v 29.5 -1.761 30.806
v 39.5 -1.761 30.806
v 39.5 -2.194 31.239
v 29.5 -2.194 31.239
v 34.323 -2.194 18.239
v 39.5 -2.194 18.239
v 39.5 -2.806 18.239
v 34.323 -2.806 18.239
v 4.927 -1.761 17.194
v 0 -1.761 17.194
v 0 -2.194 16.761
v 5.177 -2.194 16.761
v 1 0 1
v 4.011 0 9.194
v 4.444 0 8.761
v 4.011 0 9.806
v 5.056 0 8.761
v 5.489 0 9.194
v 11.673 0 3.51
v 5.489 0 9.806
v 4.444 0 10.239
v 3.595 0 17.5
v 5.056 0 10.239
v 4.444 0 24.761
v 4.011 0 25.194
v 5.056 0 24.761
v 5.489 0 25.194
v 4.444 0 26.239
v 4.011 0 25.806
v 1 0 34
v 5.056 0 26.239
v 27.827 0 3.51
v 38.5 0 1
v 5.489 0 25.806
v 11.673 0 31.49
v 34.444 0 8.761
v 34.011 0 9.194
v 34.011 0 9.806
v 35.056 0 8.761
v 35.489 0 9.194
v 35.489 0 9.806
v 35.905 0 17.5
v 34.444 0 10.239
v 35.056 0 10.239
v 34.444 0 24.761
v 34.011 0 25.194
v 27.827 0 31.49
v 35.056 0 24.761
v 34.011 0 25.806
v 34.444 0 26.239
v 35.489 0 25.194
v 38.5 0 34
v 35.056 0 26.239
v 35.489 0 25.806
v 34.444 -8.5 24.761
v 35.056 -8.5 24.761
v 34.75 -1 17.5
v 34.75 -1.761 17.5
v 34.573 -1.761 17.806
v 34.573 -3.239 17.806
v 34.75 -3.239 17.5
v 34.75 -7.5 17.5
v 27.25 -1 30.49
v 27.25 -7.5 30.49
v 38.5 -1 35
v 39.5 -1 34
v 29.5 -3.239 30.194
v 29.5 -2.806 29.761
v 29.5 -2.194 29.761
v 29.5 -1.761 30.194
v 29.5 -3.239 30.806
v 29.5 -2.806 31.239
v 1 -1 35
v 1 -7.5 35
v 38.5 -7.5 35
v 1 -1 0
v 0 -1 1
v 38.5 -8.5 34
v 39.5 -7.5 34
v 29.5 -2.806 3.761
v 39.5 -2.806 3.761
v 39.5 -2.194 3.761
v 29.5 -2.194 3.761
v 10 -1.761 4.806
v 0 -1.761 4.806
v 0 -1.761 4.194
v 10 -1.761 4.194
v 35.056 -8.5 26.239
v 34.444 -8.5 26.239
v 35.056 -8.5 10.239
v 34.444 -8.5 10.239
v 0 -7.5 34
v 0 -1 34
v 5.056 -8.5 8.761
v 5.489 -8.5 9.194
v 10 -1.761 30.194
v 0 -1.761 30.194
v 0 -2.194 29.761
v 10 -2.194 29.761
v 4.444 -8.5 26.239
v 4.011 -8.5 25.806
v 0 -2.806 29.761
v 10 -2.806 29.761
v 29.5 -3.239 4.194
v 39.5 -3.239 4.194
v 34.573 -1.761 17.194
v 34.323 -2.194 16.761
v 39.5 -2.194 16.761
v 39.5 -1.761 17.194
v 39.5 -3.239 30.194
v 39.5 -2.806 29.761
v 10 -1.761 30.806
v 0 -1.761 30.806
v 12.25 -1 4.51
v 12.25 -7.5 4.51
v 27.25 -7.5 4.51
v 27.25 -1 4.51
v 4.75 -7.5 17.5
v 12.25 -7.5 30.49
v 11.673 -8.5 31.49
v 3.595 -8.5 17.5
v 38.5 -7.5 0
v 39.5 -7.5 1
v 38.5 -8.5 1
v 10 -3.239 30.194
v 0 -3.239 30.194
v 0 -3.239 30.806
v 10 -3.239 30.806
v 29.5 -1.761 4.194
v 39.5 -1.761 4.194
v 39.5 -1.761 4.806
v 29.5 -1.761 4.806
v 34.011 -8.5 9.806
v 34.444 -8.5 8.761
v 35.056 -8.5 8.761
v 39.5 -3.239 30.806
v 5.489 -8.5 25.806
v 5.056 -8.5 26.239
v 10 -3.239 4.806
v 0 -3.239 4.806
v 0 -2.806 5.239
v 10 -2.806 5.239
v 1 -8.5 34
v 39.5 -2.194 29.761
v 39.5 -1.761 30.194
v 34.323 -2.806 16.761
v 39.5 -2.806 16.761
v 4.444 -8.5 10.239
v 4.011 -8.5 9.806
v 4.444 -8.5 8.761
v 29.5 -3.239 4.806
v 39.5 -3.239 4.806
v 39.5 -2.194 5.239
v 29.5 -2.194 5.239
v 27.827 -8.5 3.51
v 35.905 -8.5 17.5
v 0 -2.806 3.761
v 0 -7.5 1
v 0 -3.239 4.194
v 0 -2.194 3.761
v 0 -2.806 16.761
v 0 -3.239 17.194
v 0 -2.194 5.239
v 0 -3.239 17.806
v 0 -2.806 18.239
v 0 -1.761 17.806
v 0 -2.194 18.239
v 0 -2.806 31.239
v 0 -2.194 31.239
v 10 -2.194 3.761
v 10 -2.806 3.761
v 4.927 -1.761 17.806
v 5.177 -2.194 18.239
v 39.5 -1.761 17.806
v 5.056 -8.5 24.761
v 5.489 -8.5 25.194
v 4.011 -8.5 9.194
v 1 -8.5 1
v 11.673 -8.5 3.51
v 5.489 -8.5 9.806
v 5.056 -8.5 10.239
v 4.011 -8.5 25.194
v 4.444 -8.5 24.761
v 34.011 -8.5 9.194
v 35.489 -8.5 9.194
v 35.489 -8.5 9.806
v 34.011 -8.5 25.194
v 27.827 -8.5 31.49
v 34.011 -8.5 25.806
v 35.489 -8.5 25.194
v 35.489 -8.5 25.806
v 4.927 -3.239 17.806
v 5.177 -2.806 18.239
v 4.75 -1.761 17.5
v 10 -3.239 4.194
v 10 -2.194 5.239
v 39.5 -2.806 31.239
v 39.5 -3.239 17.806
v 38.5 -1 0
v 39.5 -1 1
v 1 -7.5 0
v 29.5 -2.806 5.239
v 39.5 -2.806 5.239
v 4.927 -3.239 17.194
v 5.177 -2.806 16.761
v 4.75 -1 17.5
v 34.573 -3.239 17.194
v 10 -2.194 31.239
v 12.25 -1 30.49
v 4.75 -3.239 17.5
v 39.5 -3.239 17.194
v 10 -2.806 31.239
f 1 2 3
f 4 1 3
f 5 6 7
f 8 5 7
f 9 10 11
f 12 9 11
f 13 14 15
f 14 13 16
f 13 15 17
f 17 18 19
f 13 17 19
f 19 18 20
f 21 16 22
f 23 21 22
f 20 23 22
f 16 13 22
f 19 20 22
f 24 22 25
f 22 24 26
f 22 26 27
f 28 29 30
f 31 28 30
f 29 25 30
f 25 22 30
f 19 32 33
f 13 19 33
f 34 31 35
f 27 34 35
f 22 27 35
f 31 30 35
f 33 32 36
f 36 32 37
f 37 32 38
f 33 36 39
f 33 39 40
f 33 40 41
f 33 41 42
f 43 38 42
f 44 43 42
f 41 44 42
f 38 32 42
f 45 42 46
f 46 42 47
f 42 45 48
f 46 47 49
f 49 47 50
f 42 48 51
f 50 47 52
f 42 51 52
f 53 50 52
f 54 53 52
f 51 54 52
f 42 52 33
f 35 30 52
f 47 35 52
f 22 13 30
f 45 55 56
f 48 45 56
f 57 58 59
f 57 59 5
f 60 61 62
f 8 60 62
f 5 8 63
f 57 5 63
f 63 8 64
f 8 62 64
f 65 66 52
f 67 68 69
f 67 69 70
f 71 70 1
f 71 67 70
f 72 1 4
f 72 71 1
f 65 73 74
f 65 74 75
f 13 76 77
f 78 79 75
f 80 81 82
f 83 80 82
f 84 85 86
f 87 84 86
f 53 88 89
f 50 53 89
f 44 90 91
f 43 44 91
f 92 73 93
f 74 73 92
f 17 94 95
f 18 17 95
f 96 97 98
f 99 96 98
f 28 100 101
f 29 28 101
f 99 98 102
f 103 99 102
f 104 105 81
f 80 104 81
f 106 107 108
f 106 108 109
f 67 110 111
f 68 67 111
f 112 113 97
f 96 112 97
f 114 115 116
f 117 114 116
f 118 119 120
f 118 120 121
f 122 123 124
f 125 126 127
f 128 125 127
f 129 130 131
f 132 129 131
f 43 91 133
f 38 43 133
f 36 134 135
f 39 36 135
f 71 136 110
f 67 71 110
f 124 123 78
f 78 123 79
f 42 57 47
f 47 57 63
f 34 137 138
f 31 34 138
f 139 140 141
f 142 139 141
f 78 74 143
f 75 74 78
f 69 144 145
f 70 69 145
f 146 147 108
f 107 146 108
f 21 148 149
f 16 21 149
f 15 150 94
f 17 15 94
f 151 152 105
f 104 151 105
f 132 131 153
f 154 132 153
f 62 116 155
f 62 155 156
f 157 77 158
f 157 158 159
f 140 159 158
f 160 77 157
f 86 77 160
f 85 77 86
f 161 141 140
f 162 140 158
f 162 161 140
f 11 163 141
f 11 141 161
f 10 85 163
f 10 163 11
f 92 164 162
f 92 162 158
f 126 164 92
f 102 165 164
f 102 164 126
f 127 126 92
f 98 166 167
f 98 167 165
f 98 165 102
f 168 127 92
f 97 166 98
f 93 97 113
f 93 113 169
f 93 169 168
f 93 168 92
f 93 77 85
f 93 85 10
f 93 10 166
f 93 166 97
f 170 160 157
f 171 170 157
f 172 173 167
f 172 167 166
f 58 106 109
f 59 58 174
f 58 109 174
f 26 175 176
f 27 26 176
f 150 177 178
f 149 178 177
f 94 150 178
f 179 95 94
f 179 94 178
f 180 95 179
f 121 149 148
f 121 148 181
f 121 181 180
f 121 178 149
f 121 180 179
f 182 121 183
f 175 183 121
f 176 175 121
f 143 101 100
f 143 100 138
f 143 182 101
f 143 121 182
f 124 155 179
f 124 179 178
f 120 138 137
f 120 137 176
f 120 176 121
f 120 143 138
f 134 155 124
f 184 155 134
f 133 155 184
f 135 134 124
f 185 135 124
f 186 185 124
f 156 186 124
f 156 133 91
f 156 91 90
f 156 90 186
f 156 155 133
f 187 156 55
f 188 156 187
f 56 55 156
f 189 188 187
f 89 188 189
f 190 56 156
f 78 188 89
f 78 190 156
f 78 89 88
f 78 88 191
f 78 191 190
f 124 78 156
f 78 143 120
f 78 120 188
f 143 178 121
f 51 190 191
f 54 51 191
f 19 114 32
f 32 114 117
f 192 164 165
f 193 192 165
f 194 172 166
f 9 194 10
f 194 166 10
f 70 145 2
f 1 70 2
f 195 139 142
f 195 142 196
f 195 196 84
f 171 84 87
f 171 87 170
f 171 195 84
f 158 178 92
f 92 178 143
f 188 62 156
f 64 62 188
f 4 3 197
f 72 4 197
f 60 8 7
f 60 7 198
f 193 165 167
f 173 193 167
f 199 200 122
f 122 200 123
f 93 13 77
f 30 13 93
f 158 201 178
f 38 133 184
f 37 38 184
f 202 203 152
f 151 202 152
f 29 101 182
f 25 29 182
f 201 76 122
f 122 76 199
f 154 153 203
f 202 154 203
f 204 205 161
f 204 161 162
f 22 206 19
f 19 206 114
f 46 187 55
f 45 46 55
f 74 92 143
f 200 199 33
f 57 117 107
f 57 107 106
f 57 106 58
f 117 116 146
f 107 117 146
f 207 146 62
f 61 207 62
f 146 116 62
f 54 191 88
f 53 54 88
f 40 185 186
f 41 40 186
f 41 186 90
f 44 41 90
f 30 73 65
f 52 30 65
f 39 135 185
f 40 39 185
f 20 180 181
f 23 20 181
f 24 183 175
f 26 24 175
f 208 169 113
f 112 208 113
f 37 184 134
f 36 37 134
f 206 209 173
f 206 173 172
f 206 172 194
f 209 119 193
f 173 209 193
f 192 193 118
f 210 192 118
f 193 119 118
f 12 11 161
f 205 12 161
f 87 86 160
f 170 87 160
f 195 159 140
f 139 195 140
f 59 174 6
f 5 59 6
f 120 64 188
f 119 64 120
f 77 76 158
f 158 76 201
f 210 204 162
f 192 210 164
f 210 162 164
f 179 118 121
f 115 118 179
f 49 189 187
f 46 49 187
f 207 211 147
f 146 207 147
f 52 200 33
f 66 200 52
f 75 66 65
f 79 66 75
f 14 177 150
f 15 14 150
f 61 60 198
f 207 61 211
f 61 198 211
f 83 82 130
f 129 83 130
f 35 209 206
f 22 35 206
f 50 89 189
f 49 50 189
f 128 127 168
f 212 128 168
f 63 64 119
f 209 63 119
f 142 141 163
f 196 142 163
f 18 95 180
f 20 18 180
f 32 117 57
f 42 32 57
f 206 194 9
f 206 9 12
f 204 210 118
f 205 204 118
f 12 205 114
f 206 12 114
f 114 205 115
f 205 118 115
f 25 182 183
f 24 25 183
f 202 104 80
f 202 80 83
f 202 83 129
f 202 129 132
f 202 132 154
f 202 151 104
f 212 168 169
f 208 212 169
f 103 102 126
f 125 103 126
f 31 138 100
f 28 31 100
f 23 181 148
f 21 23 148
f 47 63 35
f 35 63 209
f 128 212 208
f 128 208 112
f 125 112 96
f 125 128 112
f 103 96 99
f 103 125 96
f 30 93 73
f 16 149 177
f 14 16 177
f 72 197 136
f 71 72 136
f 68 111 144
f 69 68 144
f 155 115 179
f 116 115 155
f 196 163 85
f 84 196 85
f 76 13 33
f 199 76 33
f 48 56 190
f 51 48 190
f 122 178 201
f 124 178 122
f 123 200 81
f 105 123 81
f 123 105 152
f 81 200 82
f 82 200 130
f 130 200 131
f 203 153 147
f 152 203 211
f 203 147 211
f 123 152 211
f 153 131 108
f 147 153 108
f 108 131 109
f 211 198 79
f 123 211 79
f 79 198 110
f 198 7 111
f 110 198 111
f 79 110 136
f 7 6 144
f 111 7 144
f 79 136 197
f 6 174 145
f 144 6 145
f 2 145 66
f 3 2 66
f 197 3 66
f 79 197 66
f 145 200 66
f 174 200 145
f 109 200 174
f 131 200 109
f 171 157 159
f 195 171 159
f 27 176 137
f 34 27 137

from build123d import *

# Parameters (mm, degrees)
SKETCH_W        = 39.5
SKETCH_H        = 35
PAD_DEPTH       = 8.5
POCKET_DEPTH    = 10
POCKET001_DEPTH = 10
POCKET002_DEPTH = 8.501
CHAMFER_SIZE    = 1
CHAMFER001_SIZE = 1


with BuildPart() as part:
    # Sketch → Pad (new body)
    with BuildSketch(Plane.XZ):
        with Locations((19.75, 17.5)):
            Rectangle(SKETCH_W, SKETCH_H)
    extrude(amount=PAD_DEPTH)

    # Sketch001 (on Face2 of Pad) → Pocket (cut)
    with BuildSketch(Plane(origin=(39.5, 0, 0), x_dir=(0, 0, 1), z_dir=(1, 0, 0))):
        Polygon((4.193853, 3.239104), (3.760896, 2.806147), (3.760896, 2.193853), (4.193853, 1.760896), (4.806147, 1.760896), (5.239104, 2.193853), (5.239104, 2.806147), (4.806147, 3.239104), align=None)
        Polygon((17.193853, 3.239104), (16.760896, 2.806147), (16.760896, 2.193853), (17.193853, 1.760896), (17.806147, 1.760896), (18.239104, 2.193853), (18.239104, 2.806147), (17.806147, 3.239104), align=None)
        Polygon((30.193853, 3.239104), (29.760896, 2.806147), (29.760896, 2.193853), (30.193853, 1.760896), (30.806147, 1.760896), (31.239104, 2.193853), (31.239104, 2.806147), (30.806147, 3.239104), align=None)
    extrude(amount=-POCKET_DEPTH, mode=Mode.SUBTRACT)

    # Sketch003 (on Face2 of Pocket) → Pocket001 (cut)
    with BuildSketch(Plane(origin=(0, 0, 0), x_dir=(0, 0, -1), z_dir=(-1, 0, 0))):
        Polygon((-30.806147, 3.239104), (-31.239104, 2.806147), (-31.239104, 2.193853), (-30.806147, 1.760896), (-30.193853, 1.760896), (-29.760896, 2.193853), (-29.760896, 2.806147), (-30.193853, 3.239104), align=None)
        Polygon((-17.806147, 3.239104), (-18.239104, 2.806147), (-18.239104, 2.193853), (-17.806147, 1.760896), (-17.193853, 1.760896), (-16.760896, 2.193853), (-16.760896, 2.806147), (-17.193853, 3.239104), align=None)
        Polygon((-4.806147, 3.239104), (-5.239104, 2.806147), (-5.239104, 2.193853), (-4.806147, 1.760896), (-4.193853, 1.760896), (-3.760896, 2.193853), (-3.760896, 2.806147), (-4.193853, 3.239104), align=None)
    extrude(amount=-POCKET001_DEPTH, mode=Mode.SUBTRACT)

    # Sketch004 (on Face5 of Pocket001) → Pocket002 (cut, through all)
    with BuildSketch(Plane.XZ.offset(8.5)):
        Polygon((4.443853, 26.239104), (4.010896, 25.806147), (4.010896, 25.193853), (4.443853, 24.760896), (5.056147, 24.760896), (5.489104, 25.193853), (5.489104, 25.806147), (5.056147, 26.239104), align=None)
        Polygon((34.443853, 26.239104), (34.010896, 25.806147), (34.010896, 25.193853), (34.443853, 24.760896), (35.056147, 24.760896), (35.489104, 25.193853), (35.489104, 25.806147), (35.056147, 26.239104), align=None)
        Polygon((34.443853, 10.239104), (34.010896, 9.806147), (34.010896, 9.193853), (34.443853, 8.760896), (35.056147, 8.760896), (35.489104, 9.193853), (35.489104, 9.806147), (35.056147, 10.239104), align=None)
        Polygon((4.443853, 10.239104), (4.010896, 9.806147), (4.010896, 9.193853), (4.443853, 8.760896), (5.056147, 8.760896), (5.489104, 9.193853), (5.489104, 9.806147), (5.056147, 10.239104), align=None)
        Polygon((12.25, 4.509619), (27.25, 4.509619), (34.75, 17.5), (27.25, 30.490381), (12.25, 30.490381), (4.75, 17.5), align=None)
    extrude(amount=-POCKET002_DEPTH, mode=Mode.SUBTRACT)

    # Chamfer
    chamfer_edges = [part.edges().sort_by_distance(p)[0] for p in [
        (39.5, -4.25, 35),
        (0, -4.25, 35),
        (0, -4.25, 0),
        (39.5, -4.25, 0),
        (39.5, -8.5, 17.5),
        (19.75, -8.5, 0),
        (19.75, 0, 0),
        (39.5, 0, 17.5),
        (0, 0, 17.5),
        (0, -8.5, 17.5),
        (19.75, -8.5, 35),
        (19.75, 0, 35),
    ]]
    chamfer(chamfer_edges, length=CHAMFER_SIZE)

    # Chamfer001
    chamfer001_edges = [part.edges().sort_by_distance(p)[0] for p in [
        (31, -8.5, 11.004809),
        (19.75, -8.5, 4.509619),
        (31, -8.5, 23.995191),
        (19.75, -8.5, 30.490381),
        (8.5, -8.5, 23.995191),
        (8.5, -8.5, 11.004809),
        (8.5, 0, 23.995191),
        (19.75, 0, 30.490381),
        (31, 0, 23.995191),
        (31, 0, 11.004809),
        (19.75, 0, 4.509619),
        (8.5, 0, 11.004809),
    ]]
    chamfer(chamfer001_edges, length=CHAMFER001_SIZE)


solid = part.part
